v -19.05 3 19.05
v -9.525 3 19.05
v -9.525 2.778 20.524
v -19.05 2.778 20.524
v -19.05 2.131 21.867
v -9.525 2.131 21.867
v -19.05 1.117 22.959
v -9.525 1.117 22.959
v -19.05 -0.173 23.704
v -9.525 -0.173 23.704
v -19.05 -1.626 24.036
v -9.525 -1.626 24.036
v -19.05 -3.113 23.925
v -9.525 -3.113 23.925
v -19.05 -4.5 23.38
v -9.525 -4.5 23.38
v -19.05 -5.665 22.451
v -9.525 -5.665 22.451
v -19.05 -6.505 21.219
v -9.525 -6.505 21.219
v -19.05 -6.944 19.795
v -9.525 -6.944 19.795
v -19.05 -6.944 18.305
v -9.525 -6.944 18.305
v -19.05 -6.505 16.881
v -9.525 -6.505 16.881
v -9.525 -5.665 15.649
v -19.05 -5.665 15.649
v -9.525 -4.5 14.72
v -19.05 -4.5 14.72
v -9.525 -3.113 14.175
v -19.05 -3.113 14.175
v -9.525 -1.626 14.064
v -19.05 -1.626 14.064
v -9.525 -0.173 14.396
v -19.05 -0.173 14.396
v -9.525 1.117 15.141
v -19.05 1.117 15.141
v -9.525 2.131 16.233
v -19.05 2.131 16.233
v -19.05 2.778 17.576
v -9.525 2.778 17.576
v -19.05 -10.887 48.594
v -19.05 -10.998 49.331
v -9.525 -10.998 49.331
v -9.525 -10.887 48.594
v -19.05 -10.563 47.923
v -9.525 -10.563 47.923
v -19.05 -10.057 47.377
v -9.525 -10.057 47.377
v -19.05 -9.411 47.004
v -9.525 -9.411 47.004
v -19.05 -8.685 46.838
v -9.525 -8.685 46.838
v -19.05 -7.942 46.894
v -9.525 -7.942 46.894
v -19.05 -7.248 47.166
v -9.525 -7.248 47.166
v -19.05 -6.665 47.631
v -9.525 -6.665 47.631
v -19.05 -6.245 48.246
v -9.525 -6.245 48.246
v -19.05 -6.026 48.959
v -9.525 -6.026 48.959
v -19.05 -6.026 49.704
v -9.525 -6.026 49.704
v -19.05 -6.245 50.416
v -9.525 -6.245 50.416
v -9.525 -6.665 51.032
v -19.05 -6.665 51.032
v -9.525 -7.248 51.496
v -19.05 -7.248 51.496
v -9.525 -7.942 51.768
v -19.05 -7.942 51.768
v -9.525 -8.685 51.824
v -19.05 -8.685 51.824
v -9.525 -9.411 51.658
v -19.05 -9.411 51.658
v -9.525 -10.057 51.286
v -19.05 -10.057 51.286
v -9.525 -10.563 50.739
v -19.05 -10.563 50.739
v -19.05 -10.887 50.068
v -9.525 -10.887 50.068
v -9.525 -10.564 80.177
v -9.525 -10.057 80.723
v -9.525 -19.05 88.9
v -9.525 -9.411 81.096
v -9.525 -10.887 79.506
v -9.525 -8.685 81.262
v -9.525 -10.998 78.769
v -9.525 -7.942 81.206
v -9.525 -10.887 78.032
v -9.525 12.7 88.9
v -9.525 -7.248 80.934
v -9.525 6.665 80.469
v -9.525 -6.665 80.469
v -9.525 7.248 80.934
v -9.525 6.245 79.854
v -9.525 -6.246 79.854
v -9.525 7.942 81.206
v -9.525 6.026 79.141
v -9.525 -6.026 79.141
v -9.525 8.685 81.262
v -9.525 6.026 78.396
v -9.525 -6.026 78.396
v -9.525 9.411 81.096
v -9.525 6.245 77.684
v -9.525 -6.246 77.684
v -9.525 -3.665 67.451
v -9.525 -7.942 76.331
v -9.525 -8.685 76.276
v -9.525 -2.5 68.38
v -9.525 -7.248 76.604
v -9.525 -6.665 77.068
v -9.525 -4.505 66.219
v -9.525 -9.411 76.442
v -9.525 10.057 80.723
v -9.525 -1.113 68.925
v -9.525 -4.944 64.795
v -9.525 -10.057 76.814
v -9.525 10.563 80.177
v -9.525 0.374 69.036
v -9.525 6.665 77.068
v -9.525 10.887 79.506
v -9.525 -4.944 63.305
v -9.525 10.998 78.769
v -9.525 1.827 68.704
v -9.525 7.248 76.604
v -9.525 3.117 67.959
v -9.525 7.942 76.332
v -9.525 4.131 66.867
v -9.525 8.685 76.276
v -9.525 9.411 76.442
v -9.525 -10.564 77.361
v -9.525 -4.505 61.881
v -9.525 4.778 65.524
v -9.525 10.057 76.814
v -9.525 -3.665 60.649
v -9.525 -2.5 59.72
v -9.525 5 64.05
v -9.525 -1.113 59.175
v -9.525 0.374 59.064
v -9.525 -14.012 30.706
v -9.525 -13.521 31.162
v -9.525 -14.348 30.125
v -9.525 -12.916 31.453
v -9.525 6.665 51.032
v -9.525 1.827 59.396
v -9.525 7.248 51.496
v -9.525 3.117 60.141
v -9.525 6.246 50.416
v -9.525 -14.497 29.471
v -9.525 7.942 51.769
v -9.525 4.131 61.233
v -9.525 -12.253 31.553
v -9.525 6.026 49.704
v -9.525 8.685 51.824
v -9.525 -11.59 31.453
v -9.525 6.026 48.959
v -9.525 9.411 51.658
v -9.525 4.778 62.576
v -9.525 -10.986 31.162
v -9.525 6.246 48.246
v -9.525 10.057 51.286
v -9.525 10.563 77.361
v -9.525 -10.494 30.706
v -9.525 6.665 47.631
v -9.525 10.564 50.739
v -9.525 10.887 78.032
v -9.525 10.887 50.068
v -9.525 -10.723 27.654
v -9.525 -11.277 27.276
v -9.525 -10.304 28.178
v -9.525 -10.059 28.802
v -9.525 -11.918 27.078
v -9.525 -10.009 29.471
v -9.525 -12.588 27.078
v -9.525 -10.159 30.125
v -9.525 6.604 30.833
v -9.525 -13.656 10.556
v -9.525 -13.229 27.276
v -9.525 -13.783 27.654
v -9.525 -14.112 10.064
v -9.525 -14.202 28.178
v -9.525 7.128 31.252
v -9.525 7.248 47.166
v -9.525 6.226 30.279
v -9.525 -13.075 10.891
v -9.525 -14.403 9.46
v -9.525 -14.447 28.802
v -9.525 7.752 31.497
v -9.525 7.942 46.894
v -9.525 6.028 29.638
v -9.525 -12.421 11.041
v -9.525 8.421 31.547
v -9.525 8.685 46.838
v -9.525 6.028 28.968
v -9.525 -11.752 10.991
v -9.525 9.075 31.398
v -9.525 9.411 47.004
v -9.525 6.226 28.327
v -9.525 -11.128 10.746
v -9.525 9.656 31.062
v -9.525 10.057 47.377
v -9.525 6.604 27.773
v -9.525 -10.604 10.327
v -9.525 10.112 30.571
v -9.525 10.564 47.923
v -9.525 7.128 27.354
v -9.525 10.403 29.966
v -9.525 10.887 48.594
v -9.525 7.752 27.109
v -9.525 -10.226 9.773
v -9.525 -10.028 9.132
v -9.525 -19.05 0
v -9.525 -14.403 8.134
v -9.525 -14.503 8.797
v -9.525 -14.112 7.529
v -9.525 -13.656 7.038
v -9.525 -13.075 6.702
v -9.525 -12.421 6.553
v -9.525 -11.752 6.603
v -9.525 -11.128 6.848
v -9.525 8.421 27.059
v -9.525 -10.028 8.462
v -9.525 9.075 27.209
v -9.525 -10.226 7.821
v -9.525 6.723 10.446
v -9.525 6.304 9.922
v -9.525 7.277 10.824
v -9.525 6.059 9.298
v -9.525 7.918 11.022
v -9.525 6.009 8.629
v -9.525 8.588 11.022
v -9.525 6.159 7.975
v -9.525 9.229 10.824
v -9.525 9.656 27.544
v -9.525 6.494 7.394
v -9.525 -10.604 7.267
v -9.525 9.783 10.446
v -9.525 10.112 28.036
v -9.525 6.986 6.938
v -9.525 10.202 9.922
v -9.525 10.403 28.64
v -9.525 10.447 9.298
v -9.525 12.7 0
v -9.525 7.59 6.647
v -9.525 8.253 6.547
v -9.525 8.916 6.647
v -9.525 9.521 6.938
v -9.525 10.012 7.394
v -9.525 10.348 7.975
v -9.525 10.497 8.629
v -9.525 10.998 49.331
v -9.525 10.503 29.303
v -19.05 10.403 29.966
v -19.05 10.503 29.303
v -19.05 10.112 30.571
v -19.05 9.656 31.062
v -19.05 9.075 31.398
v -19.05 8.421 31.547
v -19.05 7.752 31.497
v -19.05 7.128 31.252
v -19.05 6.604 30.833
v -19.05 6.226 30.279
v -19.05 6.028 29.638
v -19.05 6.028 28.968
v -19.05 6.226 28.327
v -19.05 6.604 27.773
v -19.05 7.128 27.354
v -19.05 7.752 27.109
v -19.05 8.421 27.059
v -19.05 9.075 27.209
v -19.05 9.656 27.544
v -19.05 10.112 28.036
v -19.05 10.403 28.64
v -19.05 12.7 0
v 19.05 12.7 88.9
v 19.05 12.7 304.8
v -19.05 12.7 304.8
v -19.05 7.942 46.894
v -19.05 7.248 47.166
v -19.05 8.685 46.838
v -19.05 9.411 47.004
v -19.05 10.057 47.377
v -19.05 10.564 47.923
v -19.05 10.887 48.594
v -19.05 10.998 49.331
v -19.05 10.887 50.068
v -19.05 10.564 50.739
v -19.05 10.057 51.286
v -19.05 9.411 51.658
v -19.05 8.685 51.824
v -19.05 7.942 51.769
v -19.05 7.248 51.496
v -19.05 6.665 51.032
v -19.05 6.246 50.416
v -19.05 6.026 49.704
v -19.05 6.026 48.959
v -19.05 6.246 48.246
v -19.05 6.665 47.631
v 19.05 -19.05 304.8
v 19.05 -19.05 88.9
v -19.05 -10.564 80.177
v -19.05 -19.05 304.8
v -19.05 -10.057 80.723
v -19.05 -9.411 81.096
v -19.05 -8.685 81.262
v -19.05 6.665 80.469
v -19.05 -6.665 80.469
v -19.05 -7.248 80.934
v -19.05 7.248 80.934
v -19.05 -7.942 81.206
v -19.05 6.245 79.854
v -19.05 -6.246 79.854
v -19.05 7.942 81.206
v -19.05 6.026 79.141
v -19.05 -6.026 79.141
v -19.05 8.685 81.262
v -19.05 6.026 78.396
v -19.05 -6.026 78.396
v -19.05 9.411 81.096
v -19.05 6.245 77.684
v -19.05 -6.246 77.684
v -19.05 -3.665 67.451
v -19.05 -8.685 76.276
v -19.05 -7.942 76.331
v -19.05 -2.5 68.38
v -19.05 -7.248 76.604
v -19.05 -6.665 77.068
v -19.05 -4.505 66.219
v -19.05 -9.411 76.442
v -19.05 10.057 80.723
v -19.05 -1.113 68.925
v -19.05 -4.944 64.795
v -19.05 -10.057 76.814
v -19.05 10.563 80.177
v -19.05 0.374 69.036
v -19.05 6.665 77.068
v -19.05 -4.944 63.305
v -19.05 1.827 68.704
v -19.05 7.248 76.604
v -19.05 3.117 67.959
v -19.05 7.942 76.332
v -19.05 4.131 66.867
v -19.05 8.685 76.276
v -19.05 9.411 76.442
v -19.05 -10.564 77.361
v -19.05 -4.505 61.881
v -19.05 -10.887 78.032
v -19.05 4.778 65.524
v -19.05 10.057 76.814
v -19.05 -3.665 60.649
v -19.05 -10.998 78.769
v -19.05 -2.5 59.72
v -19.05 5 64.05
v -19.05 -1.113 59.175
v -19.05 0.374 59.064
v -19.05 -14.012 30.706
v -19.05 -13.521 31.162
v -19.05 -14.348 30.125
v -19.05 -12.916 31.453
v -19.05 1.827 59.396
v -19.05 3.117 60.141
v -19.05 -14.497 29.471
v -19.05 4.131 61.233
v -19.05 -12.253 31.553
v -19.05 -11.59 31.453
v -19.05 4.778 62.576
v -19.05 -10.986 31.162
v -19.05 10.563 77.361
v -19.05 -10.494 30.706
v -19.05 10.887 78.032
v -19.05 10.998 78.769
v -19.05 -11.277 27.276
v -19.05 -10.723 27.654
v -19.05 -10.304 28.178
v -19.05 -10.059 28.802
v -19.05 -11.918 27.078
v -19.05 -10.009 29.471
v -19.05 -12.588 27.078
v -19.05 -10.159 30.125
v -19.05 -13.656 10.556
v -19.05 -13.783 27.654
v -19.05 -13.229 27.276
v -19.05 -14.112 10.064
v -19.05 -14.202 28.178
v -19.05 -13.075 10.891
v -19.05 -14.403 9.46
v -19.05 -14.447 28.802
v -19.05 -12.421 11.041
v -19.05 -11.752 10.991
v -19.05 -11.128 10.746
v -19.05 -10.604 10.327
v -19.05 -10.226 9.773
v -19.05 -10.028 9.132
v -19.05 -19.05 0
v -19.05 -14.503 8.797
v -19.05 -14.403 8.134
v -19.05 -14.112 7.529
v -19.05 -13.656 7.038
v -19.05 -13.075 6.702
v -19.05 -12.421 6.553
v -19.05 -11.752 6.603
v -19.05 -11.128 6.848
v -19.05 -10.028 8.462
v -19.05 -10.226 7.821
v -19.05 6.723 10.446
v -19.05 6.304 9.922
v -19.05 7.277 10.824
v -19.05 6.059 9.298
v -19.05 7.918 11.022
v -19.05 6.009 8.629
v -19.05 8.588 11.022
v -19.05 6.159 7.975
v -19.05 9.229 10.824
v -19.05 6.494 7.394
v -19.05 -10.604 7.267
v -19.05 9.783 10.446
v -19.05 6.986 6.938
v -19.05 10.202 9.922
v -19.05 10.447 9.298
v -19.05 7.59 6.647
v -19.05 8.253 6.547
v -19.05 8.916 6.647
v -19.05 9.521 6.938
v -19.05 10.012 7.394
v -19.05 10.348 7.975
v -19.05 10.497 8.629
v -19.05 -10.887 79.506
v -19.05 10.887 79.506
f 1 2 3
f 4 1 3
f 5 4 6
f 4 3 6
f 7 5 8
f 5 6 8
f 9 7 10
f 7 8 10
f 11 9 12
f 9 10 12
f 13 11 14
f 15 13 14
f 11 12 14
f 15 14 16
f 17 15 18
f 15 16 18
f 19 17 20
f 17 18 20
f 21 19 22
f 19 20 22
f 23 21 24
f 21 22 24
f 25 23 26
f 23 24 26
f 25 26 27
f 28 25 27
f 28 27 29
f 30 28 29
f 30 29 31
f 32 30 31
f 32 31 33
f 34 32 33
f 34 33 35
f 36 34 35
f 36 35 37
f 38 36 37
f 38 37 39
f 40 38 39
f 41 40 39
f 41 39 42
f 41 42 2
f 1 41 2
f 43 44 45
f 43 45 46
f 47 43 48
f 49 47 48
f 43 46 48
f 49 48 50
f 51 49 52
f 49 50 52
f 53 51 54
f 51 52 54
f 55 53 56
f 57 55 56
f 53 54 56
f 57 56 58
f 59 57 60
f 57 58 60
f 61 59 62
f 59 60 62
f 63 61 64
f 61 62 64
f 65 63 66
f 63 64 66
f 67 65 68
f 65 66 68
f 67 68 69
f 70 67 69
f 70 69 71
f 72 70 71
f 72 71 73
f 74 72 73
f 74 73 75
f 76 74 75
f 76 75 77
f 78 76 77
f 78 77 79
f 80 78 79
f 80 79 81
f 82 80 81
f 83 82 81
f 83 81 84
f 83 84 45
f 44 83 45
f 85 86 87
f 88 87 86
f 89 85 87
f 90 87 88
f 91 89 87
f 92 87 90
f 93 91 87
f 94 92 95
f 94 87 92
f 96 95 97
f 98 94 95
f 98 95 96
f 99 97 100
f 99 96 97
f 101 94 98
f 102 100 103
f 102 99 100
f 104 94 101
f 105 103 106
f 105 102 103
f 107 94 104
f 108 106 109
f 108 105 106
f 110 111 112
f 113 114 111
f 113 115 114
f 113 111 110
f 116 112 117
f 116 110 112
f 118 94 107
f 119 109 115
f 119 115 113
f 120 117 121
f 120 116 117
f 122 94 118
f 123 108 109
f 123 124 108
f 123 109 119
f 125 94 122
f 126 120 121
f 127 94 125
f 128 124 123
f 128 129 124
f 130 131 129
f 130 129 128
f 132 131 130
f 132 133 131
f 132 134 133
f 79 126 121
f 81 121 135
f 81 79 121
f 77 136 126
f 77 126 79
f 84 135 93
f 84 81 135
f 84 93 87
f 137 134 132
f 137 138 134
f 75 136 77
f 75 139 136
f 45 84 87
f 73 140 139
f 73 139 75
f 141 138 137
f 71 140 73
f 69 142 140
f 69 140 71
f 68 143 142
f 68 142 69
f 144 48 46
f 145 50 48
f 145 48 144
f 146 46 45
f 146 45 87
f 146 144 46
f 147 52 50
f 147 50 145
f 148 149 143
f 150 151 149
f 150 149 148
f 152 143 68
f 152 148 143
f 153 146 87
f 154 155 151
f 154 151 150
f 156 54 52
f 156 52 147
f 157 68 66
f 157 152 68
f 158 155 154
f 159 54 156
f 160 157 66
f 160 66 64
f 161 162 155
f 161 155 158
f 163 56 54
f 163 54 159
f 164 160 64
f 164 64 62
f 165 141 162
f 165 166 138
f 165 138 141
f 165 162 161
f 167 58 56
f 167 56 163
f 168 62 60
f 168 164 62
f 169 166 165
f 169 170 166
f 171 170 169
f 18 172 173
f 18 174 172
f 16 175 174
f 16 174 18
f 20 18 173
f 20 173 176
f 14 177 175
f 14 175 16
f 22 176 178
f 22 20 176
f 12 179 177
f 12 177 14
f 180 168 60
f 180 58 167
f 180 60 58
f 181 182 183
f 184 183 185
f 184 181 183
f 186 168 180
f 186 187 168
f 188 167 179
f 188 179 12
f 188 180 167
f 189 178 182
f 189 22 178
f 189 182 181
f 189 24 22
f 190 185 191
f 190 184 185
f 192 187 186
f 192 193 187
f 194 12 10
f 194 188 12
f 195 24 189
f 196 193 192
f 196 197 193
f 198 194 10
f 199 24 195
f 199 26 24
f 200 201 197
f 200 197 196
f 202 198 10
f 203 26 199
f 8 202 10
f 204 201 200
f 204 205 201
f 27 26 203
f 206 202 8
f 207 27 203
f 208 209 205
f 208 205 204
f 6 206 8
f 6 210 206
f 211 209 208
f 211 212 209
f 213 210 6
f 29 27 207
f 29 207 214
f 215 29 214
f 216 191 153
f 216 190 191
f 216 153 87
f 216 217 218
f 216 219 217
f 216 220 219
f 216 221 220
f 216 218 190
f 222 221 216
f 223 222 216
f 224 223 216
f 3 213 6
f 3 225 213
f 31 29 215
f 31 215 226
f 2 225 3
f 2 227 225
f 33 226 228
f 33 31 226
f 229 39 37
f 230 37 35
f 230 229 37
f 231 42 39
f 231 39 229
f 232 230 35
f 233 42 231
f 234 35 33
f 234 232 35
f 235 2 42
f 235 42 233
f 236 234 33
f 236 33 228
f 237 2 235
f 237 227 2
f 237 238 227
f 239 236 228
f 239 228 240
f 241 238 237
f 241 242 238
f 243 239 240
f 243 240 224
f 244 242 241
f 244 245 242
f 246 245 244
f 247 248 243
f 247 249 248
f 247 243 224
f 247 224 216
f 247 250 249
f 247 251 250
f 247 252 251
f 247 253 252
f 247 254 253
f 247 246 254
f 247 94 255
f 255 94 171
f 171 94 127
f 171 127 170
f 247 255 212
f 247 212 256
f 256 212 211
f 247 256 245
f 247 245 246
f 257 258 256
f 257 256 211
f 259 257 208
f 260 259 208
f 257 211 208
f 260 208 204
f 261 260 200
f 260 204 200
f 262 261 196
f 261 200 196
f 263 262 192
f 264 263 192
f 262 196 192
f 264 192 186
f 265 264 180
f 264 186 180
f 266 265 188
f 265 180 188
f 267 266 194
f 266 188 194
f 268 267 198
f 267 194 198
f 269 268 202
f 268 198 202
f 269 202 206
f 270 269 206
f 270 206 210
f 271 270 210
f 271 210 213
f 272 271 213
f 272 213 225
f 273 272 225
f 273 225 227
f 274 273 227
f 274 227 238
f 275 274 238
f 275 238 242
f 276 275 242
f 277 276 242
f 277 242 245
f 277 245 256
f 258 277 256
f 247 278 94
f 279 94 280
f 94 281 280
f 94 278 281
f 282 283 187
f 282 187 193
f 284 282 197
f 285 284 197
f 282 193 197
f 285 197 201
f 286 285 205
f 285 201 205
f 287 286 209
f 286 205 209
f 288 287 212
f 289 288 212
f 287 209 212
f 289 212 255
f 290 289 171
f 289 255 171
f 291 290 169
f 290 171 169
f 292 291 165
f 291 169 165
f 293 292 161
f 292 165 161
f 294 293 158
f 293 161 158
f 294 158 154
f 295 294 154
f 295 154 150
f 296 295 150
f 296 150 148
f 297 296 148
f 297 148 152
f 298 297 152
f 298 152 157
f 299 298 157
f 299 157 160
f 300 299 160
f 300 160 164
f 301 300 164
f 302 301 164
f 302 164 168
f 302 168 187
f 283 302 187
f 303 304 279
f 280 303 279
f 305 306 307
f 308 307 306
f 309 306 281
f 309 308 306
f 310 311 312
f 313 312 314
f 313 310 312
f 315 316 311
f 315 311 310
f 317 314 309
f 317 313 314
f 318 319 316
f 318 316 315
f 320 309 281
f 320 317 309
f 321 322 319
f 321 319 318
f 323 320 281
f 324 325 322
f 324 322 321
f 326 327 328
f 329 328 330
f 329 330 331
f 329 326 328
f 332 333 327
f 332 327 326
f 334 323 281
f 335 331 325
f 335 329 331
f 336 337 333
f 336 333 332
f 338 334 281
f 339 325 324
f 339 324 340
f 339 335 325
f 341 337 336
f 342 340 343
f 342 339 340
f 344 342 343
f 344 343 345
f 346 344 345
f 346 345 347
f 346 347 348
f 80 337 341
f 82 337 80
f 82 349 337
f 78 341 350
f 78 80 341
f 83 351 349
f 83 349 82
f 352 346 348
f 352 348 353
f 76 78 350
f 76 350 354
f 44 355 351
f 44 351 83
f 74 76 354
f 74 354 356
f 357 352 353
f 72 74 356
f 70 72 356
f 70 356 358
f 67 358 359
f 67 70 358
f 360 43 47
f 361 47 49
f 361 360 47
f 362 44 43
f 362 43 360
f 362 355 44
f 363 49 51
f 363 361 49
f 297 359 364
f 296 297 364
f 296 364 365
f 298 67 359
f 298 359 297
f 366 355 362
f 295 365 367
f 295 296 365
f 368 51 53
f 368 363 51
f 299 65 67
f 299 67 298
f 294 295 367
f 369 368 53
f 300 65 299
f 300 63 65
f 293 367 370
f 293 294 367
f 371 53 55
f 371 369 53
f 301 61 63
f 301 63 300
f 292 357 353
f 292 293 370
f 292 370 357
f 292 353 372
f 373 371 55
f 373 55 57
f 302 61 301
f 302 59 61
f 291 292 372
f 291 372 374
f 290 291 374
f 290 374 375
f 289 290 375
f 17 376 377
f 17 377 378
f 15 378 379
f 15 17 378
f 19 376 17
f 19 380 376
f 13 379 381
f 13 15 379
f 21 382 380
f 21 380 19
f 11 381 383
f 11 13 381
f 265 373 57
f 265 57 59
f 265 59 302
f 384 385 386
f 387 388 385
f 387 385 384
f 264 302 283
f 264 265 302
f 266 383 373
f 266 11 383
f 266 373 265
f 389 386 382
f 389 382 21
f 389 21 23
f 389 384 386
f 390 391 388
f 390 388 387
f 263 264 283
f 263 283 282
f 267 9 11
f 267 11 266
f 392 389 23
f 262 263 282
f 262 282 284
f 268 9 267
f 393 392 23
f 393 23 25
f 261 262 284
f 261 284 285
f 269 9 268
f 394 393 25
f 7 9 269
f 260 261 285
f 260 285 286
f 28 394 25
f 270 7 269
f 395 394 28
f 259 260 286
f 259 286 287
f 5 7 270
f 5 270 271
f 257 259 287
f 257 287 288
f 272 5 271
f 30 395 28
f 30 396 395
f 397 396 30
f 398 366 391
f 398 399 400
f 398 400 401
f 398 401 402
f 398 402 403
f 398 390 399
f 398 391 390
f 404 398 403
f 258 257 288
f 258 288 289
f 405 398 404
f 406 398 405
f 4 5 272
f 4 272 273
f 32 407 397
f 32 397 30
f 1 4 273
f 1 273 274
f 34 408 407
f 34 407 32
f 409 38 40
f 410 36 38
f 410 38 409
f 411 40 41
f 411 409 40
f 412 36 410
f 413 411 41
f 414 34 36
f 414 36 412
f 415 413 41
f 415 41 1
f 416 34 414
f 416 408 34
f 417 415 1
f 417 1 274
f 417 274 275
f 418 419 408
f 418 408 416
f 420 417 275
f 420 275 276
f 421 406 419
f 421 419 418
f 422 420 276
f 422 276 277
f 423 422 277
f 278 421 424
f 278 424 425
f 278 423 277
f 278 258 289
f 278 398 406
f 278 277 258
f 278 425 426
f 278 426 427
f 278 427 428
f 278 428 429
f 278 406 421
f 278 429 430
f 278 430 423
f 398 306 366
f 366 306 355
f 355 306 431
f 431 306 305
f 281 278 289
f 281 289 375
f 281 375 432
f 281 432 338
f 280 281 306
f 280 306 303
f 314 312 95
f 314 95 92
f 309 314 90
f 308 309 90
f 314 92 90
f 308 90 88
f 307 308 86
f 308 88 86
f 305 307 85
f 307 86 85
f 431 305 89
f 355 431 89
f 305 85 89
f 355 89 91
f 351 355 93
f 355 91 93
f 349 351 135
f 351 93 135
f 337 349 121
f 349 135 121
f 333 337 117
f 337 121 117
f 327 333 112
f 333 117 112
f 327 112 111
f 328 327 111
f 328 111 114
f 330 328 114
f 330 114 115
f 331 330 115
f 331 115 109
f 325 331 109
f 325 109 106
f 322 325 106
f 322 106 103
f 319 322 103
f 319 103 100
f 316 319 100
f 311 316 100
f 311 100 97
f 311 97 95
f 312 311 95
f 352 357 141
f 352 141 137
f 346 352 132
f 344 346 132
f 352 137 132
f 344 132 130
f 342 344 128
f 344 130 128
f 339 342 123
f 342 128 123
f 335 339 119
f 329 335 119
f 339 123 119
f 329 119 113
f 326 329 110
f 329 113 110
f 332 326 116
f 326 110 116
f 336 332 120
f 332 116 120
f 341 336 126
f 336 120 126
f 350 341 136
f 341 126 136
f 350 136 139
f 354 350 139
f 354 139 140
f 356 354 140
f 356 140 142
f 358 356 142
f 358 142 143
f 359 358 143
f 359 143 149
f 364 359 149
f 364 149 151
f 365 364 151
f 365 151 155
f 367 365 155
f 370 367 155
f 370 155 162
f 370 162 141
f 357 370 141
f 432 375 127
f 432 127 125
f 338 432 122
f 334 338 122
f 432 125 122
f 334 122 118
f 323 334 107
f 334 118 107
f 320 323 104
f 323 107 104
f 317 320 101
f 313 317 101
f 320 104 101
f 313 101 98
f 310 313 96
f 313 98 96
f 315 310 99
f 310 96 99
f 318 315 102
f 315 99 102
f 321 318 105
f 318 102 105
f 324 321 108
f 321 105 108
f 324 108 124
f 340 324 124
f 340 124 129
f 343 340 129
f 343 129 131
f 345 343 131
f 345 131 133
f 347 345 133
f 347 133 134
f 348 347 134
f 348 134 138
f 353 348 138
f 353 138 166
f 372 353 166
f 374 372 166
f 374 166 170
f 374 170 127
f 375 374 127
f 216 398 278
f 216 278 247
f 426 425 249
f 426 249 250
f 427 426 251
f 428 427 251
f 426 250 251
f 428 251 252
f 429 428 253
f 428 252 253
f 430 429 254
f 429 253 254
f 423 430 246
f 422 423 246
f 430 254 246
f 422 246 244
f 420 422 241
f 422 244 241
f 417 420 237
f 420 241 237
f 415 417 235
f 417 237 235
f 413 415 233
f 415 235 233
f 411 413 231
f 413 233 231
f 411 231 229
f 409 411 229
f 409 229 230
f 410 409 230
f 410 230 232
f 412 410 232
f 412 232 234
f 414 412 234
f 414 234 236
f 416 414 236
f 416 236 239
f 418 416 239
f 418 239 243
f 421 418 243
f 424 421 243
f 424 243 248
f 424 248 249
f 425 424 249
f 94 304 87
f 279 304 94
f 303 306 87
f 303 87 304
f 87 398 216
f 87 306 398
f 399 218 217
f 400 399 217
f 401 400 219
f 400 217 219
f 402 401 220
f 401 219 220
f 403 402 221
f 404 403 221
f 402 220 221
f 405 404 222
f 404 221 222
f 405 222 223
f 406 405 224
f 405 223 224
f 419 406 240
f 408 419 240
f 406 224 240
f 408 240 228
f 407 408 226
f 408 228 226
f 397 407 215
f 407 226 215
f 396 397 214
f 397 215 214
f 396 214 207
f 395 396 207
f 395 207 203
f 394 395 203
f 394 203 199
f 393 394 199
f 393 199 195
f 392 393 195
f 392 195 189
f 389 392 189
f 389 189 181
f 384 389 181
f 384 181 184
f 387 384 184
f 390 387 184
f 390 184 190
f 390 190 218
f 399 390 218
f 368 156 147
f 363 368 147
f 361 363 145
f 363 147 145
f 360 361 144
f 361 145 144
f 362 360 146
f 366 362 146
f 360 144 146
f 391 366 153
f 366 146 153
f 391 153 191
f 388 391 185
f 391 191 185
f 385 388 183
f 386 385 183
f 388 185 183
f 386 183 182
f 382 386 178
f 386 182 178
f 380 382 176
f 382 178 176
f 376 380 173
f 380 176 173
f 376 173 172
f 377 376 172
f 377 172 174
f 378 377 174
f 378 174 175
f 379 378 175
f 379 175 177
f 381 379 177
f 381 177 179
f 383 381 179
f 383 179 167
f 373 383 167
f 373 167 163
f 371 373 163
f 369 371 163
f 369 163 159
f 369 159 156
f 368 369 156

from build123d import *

# Parameters (mm, degrees)
SKETCH1_W           = 38.1
SKETCH1_H           = 38.1
BOSS_EXTRUDE1_DEPTH = 304.8
SKETCH2_R           = 5
CUT_EXTRUDE1_DEPTH  = 308.762168728
SKETCH4_R           = 2.5
CUT_EXTRUDE3_DEPTH  = 308.762168728
CIRPATTERN2_COUNT   = 6
SKETCH5_R           = 2.25
CUT_EXTRUDE4_DEPTH  = 308.762168728
CIRPATTERN3_COUNT   = 4
SKETCH6_W           = 88.9
SKETCH6_H           = 38.1
CUT_EXTRUDE5_DEPTH  = 28.575
SKETCH7_W           = 38.1
SKETCH7_H           = 6.35
CUT_EXTRUDE6_DEPTH  = 306.9883086


with BuildPart() as part:
    # Sketch1 → Boss-Extrude1 (new body)
    with BuildSketch(Plane.XY):
        Rectangle(SKETCH1_W, SKETCH1_H)
    extrude(amount=BOSS_EXTRUDE1_DEPTH)

    # Sketch2 → Cut-Extrude1 (cut, through all)
    with BuildSketch(Plane(origin=(19.05, 0, 0), x_dir=(0, 0, -1), z_dir=(1, 0, 0))):
        with Locations(Location((-19.05, -2, 0), (0, 0, 90))):
            Circle(SKETCH2_R)
        with Locations(Location((-64.05, 0, 0), (0, 0, 90))):
            Circle(SKETCH2_R)
    extrude(amount=-CUT_EXTRUDE1_DEPTH, mode=Mode.SUBTRACT)

    # Sketch4 → Cut-Extrude3 (cut, through all)
    with BuildSketch(Plane(origin=(19.05, 0, 0), x_dir=(0, 0, -1), z_dir=(1, 0, 0))):
        with Locations(Location((-78.768873451, 8.497872059, 0), (0, 0, 90))):
            Circle(SKETCH4_R)
    cut_extrude3 = extrude(amount=-CUT_EXTRUDE3_DEPTH, mode=Mode.SUBTRACT)

    # CirPattern2: Cut-Extrude3 ×6 about axis, 2 skipped
    cirpattern2_axis = Axis((0, 0, 64.05), (1, 0, 0))
    add([cut_extrude3.rotate(cirpattern2_axis, i * 360 / CIRPATTERN2_COUNT) for i in range(1, CIRPATTERN2_COUNT) if i not in (2, 5)], mode=Mode.SUBTRACT)

    # Sketch5 → Cut-Extrude4 (cut, through all)
    with BuildSketch(Plane(origin=(19.05, 0, 0), x_dir=(0, 0, -1), z_dir=(1, 0, 0))):
        with Locations(Location((-29.303048327, 8.253048327, 0), (0, 0, 90))):
            Circle(SKETCH5_R)
    cut_extrude4 = extrude(amount=-CUT_EXTRUDE4_DEPTH, mode=Mode.SUBTRACT)

    # CirPattern3: Cut-Extrude4 ×4 about axis
    cirpattern3_axis = Axis((0, -2, 19.05), (1, 0, 0))
    for i in range(1, CIRPATTERN3_COUNT):
        add(cut_extrude4.rotate(cirpattern3_axis, i * 360 / CIRPATTERN3_COUNT), mode=Mode.SUBTRACT)

    # Sketch6 → Cut-Extrude5 (cut)
    with BuildSketch(Plane(origin=(19.05, 0, 0), x_dir=(0, 0, -1), z_dir=(1, 0, 0))):
        with Locations((-44.45, 0)):
            Rectangle(SKETCH6_W, SKETCH6_H)
    extrude(amount=-CUT_EXTRUDE5_DEPTH, mode=Mode.SUBTRACT)

    # Sketch7 → Cut-Extrude6 (cut, through all)
    with BuildSketch(Plane.XY.offset(304.8)):
        with Locations((0, 15.875)):
            Rectangle(SKETCH7_W, SKETCH7_H)
    extrude(amount=-CUT_EXTRUDE6_DEPTH, mode=Mode.SUBTRACT)


solid = part.part
